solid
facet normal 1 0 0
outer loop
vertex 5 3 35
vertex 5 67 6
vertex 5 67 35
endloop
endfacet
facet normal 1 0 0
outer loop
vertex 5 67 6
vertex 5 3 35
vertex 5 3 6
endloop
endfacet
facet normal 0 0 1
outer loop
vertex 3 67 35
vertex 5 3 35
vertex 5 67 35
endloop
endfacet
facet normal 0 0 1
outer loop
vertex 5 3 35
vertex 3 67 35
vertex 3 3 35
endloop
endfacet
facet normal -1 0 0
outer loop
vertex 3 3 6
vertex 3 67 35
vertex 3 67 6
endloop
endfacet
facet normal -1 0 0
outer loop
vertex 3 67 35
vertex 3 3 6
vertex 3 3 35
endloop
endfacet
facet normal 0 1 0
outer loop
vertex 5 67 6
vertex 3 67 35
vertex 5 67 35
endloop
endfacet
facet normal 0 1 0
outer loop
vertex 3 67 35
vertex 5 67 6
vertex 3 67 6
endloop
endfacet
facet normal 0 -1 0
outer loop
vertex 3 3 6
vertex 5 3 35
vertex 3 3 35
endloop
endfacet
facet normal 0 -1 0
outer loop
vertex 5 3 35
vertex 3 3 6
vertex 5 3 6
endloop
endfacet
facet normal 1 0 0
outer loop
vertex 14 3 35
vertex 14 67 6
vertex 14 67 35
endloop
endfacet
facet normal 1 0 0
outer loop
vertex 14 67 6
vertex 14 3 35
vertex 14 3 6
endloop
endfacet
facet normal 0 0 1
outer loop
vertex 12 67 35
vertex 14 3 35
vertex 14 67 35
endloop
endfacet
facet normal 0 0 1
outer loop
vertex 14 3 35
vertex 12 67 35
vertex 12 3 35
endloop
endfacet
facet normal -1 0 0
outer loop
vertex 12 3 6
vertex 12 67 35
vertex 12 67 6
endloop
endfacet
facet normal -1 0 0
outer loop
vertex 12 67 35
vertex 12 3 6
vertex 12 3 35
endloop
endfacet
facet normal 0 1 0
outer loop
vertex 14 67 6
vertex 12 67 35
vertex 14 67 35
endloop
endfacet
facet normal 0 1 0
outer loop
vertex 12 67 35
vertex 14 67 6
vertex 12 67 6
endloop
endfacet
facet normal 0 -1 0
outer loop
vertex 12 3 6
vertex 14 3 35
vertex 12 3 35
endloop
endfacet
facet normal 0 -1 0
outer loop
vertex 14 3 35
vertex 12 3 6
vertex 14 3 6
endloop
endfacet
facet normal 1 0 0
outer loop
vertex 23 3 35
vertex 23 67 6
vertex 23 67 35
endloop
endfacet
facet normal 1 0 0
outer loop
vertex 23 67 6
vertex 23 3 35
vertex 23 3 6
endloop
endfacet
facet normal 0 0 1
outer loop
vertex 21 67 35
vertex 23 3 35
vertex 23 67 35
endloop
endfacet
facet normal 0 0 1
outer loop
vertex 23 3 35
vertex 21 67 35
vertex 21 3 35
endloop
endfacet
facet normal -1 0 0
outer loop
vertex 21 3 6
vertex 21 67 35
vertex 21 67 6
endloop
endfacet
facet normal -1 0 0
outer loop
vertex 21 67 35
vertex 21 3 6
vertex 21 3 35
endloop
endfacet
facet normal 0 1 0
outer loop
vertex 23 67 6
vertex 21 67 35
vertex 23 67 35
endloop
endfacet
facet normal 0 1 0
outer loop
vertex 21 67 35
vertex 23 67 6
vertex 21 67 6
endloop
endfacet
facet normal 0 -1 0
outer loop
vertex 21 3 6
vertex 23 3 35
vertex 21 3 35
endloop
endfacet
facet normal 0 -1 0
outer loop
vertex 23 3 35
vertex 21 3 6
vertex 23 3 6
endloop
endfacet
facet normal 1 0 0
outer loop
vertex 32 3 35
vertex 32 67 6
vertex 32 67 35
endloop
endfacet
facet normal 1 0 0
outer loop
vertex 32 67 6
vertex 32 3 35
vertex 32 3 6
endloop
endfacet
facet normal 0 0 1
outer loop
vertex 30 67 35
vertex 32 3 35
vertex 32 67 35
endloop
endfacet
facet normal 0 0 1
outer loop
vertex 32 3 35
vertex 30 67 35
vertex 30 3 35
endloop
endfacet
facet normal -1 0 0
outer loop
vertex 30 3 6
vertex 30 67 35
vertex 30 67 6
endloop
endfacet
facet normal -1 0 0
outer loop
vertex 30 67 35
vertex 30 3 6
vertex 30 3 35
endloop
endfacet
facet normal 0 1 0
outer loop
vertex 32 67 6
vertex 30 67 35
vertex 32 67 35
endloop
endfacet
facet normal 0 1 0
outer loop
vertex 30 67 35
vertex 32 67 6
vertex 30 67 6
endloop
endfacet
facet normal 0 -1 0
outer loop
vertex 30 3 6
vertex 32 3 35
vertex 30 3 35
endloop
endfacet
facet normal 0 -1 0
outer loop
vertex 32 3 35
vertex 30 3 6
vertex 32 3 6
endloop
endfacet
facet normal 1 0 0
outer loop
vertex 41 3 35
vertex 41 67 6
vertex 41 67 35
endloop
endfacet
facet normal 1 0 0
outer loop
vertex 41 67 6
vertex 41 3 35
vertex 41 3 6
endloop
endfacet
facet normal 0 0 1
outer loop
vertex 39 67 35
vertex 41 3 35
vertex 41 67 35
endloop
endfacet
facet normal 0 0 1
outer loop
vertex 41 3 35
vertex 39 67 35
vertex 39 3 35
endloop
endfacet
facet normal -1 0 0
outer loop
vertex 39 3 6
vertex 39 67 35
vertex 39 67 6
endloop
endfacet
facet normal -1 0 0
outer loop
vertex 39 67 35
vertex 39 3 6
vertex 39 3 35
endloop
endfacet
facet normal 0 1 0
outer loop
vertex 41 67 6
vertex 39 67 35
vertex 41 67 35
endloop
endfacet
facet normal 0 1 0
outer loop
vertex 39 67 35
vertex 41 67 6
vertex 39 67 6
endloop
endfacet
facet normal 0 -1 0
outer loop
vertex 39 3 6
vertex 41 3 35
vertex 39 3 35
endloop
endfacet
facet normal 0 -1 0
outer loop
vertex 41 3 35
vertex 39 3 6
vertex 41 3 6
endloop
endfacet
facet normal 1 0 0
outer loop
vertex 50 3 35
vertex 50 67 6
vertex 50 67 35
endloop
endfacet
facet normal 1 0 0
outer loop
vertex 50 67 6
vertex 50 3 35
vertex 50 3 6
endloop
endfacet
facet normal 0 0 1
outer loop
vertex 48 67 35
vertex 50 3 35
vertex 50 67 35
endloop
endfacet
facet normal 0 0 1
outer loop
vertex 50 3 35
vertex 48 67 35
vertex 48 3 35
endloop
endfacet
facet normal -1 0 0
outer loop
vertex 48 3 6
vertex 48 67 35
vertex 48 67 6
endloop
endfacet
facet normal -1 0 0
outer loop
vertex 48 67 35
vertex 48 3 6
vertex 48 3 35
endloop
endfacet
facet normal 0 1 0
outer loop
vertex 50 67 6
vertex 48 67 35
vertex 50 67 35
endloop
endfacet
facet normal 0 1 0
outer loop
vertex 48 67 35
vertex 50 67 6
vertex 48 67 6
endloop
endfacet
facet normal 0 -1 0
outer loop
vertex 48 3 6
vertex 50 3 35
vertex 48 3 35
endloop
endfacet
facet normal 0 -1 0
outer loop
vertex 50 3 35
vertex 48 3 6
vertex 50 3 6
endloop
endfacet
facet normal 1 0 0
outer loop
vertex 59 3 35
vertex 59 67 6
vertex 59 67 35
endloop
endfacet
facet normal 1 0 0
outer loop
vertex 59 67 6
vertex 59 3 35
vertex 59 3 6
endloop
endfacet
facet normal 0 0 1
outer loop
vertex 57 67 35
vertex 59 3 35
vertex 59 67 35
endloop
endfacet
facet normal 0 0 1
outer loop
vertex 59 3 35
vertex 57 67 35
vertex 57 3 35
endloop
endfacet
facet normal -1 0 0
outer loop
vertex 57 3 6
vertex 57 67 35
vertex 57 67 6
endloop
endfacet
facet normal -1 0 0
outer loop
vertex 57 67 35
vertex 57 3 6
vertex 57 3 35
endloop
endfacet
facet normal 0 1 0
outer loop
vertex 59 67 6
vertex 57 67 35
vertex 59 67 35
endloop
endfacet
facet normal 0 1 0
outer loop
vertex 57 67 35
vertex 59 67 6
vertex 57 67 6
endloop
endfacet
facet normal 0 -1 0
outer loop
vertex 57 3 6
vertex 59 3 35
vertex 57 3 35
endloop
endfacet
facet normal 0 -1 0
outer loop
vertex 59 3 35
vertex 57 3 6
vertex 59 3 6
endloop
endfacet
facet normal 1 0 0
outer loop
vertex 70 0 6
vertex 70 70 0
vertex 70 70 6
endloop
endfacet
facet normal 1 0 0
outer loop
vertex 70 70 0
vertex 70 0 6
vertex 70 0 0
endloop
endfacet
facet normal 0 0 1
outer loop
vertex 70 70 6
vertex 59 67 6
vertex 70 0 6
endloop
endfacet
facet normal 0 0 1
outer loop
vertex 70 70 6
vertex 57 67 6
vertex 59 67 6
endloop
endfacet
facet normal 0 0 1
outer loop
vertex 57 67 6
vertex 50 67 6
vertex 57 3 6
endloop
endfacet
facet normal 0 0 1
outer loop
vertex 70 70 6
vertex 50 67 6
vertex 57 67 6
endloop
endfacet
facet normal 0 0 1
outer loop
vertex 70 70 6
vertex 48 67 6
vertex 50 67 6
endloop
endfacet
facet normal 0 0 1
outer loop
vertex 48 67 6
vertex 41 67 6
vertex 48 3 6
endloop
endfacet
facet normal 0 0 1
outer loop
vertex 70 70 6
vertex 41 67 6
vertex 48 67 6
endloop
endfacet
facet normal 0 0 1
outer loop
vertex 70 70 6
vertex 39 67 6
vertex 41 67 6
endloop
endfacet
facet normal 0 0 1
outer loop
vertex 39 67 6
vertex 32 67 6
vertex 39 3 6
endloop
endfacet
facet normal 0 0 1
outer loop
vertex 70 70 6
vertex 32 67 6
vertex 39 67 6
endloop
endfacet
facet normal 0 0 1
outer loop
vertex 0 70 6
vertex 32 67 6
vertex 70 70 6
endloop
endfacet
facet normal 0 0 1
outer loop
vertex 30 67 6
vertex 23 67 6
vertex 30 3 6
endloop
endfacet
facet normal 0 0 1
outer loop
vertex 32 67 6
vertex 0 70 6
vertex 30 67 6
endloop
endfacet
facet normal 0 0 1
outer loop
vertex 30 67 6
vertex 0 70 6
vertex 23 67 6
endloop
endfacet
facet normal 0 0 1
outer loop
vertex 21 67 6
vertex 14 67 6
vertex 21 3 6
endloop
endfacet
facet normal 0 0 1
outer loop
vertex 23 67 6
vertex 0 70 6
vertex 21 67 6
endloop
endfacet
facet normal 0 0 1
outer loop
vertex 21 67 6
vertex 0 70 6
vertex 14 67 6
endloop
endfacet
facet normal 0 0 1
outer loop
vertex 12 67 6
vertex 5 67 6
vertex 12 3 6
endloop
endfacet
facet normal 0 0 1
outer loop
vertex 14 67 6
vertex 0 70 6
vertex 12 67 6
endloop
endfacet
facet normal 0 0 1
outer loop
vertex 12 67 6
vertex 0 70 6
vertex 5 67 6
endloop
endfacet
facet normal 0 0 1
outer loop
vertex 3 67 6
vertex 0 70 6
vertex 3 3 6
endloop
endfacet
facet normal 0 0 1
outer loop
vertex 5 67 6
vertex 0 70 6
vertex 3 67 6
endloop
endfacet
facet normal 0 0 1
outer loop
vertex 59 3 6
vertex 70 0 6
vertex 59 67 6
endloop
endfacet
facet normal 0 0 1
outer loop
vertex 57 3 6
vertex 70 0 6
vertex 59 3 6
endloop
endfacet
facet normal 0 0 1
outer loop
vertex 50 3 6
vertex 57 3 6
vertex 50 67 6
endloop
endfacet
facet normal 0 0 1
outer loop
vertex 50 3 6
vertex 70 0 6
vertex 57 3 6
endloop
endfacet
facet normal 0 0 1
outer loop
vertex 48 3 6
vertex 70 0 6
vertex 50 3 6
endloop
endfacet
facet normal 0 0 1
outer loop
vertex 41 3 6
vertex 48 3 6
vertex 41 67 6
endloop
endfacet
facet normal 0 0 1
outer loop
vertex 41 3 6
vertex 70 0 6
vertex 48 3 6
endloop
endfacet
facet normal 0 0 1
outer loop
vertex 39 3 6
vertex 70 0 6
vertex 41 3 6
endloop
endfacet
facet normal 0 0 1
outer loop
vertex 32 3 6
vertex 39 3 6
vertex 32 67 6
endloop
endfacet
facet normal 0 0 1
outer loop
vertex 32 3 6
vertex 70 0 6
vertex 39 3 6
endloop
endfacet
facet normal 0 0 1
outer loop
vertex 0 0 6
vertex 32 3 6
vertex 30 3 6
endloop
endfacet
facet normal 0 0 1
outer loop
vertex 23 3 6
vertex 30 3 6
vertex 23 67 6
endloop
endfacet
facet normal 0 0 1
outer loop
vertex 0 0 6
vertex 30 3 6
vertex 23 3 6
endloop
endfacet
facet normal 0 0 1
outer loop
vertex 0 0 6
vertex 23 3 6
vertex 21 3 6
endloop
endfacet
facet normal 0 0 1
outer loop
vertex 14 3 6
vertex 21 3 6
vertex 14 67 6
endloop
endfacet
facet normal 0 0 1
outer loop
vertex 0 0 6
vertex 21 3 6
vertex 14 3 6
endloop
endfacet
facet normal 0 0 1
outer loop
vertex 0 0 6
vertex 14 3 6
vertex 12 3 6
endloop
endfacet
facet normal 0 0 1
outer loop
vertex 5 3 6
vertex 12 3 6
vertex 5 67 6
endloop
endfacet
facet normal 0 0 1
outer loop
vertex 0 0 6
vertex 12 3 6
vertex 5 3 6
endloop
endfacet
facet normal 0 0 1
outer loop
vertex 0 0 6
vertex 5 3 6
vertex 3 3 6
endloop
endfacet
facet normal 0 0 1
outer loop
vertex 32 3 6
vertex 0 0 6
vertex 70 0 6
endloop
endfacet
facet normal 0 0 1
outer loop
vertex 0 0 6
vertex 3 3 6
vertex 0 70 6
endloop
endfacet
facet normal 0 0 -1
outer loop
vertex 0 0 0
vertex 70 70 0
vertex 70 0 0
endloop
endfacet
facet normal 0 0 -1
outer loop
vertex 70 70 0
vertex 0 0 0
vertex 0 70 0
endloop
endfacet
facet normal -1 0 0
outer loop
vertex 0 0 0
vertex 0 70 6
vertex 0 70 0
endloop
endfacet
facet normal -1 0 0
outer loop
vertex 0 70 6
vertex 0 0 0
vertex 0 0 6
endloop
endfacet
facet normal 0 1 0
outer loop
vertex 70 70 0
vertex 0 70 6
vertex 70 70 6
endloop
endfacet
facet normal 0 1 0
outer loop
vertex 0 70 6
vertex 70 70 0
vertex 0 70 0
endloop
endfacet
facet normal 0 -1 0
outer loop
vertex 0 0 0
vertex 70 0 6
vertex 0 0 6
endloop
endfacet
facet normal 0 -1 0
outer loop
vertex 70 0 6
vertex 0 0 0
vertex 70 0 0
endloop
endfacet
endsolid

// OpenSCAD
$fn = 32;

// ----------------------------------------------------------------------
// Heatsink: uniform fin block
// ----------------------------------------------------------------------

// --- parameters (mm) ---
base_l = 70;              // base length, X
base_w = 70;              // base width, Y
base_t = 6;               // base plate thickness
fin_h = 30;               // fin height above the base
fin_t = 2;                // fin thickness
edge = 3;                 // margin from the base ends
pitch = 9;                // fin pitch
fit_tol = 0.05;           // tolerance for press fits, mm
free_tol = 0.2;           // tolerance for clearance fits, mm

n_fins = floor((base_l - 2 * edge - fin_t) / pitch) + 1;  // fin count
total_h = base_t + fin_h - 1;  // overall height

union() {
  cube([base_l, base_w, base_t]);
  for (i = [0 : n_fins - 1])
    translate([edge + i * pitch, edge, base_t - 1])
      cube([fin_t, base_w - 2 * edge, fin_h]);
}
